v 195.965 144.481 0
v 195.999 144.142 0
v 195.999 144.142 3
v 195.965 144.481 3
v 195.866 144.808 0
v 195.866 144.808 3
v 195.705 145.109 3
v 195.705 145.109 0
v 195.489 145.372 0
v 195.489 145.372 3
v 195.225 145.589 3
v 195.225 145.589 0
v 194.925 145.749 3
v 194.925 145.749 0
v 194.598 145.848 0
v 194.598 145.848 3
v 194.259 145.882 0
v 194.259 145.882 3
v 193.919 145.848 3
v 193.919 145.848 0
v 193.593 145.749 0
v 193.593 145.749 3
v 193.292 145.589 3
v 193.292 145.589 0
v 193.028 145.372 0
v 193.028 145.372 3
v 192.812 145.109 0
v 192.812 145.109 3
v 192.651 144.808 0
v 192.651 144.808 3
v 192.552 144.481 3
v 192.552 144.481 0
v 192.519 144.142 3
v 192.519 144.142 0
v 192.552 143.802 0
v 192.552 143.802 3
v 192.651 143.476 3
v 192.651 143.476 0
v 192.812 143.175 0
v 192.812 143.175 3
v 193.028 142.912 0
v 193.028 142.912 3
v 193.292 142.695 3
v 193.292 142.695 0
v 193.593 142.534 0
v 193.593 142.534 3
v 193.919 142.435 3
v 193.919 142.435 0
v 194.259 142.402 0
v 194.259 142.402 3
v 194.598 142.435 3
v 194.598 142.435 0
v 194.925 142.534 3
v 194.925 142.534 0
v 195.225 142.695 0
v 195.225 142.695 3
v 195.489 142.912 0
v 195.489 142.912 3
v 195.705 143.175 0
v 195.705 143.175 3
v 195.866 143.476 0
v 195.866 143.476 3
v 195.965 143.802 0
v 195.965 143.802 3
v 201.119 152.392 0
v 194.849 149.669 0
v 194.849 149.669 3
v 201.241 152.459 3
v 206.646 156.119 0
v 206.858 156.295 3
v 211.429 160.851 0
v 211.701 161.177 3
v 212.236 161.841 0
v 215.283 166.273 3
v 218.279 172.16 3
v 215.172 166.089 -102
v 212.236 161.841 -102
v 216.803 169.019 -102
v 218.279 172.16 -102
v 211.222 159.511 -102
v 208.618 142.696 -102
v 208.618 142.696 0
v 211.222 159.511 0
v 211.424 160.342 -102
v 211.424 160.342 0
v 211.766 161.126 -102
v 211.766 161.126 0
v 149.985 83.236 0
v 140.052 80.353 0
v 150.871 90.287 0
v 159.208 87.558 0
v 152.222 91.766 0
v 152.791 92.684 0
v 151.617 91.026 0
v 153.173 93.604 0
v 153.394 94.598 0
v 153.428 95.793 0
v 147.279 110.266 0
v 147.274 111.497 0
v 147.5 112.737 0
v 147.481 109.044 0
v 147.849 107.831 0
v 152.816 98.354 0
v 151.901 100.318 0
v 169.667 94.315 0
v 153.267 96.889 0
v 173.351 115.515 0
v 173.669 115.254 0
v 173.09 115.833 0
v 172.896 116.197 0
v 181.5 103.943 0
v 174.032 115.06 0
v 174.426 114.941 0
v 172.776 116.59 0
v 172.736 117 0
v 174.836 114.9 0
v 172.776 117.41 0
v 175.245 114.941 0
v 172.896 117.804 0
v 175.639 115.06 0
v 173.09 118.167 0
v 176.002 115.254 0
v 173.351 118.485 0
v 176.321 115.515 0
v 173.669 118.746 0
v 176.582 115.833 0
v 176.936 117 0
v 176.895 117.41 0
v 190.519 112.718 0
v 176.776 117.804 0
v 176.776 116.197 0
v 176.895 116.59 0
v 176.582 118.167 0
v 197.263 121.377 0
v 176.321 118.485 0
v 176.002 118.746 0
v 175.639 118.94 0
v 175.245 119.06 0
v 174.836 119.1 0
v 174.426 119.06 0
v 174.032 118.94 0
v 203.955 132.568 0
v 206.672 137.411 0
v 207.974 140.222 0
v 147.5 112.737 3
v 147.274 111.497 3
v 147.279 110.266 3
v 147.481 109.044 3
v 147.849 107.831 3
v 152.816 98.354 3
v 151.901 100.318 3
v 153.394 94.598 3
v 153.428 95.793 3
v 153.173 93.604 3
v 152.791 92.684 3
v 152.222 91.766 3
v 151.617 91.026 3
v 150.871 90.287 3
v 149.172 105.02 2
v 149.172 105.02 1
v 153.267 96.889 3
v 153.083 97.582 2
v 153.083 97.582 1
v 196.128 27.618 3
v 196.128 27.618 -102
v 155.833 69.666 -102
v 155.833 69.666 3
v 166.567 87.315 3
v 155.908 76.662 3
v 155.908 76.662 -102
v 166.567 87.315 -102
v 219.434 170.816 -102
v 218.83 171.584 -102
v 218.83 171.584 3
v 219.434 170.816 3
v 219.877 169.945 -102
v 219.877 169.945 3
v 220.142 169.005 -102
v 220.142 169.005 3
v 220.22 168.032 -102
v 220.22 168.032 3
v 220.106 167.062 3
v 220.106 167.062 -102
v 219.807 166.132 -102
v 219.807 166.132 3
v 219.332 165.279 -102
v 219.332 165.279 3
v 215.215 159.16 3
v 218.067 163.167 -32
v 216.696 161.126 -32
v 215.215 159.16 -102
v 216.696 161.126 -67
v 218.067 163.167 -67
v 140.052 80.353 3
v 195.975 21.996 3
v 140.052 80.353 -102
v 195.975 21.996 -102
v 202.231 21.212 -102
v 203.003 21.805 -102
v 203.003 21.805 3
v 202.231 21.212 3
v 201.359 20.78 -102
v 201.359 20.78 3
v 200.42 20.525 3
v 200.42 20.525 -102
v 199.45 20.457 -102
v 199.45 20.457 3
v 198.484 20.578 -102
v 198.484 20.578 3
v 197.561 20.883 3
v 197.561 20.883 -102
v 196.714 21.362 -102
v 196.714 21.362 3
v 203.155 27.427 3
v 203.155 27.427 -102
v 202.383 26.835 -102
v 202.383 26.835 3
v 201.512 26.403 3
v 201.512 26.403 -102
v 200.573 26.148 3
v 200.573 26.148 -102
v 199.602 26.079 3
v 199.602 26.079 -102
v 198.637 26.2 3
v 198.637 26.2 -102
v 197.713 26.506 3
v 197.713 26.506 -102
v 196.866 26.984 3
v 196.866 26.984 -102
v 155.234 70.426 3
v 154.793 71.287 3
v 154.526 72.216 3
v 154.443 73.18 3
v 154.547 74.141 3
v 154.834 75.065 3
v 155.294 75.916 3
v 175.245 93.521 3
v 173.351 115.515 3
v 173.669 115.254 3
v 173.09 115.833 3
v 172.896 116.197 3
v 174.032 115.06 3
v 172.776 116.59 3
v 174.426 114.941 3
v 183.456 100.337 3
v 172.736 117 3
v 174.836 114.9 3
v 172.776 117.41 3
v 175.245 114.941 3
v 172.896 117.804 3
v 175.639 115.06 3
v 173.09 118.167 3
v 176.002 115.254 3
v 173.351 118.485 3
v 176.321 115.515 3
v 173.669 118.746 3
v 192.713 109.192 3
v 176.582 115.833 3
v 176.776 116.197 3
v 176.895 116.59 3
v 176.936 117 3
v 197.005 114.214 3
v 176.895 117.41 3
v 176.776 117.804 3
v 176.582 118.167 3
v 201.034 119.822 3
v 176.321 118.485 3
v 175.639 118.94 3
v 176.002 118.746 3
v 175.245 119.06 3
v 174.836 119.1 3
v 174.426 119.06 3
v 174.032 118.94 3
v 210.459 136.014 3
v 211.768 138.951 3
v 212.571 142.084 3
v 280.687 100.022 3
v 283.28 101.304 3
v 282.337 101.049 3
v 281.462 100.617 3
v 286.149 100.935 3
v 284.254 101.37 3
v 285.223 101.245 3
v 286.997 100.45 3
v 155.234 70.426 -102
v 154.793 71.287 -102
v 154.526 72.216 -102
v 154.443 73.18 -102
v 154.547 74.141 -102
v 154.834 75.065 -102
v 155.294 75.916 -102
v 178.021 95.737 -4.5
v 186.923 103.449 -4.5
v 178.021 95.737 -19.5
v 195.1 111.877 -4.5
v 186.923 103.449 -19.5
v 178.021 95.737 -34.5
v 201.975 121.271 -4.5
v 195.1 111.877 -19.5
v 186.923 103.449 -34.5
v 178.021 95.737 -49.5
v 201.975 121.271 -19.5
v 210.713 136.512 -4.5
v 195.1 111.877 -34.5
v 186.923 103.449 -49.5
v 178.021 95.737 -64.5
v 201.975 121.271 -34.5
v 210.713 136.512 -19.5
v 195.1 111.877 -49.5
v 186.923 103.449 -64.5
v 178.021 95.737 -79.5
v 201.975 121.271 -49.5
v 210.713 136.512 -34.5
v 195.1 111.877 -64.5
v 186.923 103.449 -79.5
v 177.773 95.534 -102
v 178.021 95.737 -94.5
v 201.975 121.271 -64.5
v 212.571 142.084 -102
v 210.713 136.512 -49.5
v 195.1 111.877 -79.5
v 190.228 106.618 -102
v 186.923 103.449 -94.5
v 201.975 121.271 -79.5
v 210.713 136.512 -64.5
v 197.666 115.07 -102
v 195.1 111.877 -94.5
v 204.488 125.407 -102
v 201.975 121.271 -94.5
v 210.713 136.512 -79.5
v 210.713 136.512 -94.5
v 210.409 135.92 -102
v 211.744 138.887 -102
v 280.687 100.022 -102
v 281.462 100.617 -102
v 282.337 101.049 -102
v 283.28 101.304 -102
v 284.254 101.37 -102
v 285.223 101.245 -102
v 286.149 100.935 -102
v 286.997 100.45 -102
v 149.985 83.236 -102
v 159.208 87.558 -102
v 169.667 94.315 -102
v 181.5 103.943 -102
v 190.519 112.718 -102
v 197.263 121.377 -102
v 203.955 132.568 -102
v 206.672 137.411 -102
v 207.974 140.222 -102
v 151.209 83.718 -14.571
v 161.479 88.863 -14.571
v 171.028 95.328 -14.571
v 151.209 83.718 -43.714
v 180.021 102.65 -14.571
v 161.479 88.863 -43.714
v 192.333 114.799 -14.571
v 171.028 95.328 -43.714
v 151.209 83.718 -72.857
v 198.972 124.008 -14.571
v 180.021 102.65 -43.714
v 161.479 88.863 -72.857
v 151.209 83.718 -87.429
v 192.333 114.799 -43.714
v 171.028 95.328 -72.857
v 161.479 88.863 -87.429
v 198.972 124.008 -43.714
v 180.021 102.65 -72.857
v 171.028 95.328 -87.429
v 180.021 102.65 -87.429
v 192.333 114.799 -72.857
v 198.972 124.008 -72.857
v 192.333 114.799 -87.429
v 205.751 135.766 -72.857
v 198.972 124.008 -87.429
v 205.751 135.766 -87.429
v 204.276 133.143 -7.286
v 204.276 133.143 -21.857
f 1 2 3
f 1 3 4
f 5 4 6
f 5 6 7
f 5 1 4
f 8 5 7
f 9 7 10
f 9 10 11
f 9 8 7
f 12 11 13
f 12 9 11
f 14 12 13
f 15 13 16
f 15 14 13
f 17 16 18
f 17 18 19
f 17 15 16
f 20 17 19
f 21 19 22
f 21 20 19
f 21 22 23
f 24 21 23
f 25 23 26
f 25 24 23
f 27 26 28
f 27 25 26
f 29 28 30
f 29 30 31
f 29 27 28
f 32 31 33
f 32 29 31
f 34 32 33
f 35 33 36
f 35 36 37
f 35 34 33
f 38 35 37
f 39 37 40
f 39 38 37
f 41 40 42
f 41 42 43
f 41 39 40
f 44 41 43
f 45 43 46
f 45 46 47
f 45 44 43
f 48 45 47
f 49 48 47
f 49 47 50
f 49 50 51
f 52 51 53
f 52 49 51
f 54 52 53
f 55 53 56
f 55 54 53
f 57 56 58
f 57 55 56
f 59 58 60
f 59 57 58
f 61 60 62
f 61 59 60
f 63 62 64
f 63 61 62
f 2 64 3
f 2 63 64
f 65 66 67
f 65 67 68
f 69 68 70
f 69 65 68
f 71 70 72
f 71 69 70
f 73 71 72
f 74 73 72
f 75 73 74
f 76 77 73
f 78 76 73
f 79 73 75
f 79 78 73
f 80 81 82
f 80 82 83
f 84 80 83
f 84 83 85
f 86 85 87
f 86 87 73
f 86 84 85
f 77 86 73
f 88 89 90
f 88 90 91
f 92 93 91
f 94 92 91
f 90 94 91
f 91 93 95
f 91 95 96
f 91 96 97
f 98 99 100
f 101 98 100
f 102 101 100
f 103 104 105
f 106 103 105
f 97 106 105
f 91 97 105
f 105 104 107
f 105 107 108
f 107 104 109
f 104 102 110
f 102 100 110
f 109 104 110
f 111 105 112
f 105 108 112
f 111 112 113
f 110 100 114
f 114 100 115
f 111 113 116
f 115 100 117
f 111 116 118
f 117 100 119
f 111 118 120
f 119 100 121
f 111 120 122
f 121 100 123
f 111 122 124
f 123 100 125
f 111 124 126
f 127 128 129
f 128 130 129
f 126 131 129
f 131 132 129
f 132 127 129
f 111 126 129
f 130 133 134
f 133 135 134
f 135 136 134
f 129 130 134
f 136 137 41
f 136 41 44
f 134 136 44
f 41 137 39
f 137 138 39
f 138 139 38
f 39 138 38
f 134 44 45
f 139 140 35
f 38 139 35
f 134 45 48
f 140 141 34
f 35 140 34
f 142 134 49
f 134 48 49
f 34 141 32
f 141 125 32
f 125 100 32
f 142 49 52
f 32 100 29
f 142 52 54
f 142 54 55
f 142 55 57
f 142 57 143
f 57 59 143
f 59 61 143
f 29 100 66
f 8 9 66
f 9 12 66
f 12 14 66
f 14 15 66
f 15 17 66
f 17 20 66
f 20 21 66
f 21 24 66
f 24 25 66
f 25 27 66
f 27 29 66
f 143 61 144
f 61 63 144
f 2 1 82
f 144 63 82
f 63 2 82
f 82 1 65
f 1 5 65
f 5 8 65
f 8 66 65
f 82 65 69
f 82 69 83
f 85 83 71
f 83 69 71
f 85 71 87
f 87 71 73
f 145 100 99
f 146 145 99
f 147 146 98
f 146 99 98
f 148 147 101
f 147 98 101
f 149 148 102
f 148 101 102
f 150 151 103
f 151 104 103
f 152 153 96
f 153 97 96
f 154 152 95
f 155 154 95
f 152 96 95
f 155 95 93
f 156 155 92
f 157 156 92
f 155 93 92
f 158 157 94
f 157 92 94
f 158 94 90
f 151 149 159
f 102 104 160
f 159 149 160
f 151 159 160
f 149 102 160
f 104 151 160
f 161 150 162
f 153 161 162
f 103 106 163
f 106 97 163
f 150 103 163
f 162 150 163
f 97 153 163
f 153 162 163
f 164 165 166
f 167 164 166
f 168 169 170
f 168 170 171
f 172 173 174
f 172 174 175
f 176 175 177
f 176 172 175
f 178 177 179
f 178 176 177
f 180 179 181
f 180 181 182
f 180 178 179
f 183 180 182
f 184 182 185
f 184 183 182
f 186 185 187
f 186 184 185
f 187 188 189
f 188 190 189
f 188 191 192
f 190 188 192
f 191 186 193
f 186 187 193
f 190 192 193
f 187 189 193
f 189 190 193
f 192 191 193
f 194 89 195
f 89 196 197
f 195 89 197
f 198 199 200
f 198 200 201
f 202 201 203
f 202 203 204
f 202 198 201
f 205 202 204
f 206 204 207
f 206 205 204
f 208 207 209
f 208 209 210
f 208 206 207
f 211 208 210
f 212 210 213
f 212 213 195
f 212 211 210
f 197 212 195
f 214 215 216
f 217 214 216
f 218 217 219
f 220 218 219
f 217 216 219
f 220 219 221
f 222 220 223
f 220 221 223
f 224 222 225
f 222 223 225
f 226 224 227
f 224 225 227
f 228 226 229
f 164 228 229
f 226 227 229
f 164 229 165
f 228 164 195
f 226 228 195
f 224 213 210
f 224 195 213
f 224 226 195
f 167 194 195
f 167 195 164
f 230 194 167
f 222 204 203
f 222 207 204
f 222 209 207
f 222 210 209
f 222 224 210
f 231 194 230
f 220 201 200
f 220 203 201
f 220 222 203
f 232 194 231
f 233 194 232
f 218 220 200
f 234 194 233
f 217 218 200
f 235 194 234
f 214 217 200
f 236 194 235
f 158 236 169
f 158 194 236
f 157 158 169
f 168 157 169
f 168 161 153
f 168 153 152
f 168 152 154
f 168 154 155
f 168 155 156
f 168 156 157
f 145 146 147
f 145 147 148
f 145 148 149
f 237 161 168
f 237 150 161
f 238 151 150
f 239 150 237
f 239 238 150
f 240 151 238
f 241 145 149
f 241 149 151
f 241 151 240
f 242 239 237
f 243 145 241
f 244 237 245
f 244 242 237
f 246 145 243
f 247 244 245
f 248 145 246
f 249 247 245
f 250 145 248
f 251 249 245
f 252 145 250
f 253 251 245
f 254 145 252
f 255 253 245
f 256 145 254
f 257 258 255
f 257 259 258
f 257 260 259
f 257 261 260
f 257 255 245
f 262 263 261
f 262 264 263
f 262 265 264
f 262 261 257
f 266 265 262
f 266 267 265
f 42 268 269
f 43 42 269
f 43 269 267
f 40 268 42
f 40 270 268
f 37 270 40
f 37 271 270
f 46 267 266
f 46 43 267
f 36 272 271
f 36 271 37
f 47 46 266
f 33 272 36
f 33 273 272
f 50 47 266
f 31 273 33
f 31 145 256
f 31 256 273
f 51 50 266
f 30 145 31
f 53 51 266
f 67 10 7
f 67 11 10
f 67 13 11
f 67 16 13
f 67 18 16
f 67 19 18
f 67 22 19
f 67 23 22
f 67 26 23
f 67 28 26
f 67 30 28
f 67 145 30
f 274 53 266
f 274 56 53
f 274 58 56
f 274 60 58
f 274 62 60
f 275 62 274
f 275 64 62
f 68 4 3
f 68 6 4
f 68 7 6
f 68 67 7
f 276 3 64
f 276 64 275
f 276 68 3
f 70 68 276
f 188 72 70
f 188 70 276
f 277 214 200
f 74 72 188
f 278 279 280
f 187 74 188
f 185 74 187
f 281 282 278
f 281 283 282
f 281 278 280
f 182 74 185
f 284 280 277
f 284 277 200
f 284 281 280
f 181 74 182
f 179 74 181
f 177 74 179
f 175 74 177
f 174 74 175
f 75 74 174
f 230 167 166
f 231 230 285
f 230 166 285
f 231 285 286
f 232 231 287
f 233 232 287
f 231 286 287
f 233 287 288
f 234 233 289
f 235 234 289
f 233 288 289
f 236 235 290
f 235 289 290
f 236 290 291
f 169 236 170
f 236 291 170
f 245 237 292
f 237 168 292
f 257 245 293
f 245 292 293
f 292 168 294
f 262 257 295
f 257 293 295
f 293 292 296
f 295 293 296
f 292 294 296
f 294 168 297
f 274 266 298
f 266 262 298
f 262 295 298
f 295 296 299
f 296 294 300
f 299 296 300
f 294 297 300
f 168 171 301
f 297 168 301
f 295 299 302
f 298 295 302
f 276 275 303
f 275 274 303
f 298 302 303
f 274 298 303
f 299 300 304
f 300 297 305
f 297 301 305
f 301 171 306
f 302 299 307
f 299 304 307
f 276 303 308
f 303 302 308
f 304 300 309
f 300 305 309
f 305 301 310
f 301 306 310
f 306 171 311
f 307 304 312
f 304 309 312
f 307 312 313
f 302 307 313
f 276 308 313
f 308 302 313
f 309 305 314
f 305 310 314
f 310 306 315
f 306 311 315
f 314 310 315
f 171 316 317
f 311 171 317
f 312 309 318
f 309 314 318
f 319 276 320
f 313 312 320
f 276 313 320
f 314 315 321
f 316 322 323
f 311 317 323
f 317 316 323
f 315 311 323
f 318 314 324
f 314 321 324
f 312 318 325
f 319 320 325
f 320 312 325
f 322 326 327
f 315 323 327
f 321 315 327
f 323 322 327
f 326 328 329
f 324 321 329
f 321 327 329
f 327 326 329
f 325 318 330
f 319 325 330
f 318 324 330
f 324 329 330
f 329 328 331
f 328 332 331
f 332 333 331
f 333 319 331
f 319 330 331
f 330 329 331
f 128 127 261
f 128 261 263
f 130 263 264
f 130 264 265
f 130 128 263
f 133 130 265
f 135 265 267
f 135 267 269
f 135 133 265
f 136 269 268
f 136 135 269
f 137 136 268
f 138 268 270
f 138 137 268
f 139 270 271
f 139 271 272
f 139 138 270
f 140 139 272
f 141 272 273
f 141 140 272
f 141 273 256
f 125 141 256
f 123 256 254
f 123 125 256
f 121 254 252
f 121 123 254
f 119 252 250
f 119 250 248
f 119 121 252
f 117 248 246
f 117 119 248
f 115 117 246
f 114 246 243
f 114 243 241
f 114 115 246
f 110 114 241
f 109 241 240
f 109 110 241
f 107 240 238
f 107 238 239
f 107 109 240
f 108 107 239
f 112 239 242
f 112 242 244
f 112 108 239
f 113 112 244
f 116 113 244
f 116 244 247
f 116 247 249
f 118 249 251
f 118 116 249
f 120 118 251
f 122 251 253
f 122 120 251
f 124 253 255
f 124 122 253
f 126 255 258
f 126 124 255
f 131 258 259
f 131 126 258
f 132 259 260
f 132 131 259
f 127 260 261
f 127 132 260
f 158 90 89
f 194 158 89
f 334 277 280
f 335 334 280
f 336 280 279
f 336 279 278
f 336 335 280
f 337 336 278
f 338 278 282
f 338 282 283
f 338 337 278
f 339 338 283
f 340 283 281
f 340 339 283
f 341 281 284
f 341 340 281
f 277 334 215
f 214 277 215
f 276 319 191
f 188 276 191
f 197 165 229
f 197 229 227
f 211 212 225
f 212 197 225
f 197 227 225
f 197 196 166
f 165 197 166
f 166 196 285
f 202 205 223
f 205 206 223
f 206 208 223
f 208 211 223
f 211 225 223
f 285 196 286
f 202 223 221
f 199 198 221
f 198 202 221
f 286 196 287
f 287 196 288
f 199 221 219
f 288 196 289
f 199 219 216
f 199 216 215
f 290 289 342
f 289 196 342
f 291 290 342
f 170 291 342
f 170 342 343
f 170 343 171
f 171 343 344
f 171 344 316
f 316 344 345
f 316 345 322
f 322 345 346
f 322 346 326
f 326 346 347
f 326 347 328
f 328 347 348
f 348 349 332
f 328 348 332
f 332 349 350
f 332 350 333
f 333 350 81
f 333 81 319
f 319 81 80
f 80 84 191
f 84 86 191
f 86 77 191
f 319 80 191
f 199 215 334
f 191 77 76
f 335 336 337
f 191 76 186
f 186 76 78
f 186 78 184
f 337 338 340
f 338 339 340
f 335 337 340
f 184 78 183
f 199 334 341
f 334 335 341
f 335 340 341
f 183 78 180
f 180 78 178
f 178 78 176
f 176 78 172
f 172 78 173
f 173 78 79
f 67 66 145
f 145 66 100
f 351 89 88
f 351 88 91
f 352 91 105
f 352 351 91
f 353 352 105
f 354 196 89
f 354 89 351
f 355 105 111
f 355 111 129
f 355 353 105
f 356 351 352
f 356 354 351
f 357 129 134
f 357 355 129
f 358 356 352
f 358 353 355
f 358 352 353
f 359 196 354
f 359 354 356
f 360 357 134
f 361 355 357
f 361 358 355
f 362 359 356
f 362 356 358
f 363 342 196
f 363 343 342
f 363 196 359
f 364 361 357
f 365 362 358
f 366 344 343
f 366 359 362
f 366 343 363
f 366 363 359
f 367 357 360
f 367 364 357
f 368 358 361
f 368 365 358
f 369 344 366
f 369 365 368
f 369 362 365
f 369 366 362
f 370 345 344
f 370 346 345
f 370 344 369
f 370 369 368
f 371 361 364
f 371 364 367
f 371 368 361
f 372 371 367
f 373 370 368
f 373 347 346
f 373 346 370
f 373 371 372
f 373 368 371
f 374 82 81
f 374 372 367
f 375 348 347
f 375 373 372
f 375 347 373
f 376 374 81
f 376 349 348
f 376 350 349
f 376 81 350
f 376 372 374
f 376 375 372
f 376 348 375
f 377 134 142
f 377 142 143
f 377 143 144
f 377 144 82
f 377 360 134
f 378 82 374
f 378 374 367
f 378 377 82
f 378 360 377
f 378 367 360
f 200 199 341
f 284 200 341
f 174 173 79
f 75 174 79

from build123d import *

# Parameters (mm, degrees)
SKETCH8_R                = 2.1
SKETCH8_R_2              = 1.74
BOSS_EXTRUDE5_DEPTH      = 3
BOSS_EXTRUDE6_DEPTH      = 3
BOSS_EXTRUDE6_DEPTH_BACK = 102
CUT_EXTRUDE6_DEPTH       = 102
CUT_EXTRUDE7_DEPTH       = 351.757992155
FILLET4_START            = -103
FILLET4_DEPTH            = 106.0000125
FILLET4_2_DEPTH          = 103
FILLET4_START_2          = -102
FILLET4_3_DEPTH          = 105


with BuildPart() as part:
    # Sketch8 → Boss-Extrude5 (new body)
    with BuildSketch(Plane.XY):
        with BuildLine():
            Line((194.848649274, 149.66882856), (147.499802828, 112.737422991))
            add(Edge.make_bspline(
                [(147.499802828, 112.737422991), (145.265647531, 104.835476757), (158.932413363, 97.556045407), (150.870592183, 90.287256683)],
                knots=[0, 0, 0, 0, 1, 1, 1, 1], degree=3))
            Line((150.870592183, 90.287256683), (140.051642672, 80.353100098))
            add(Edge.make_bspline(
                [(140.051642672, 80.353100098), (155.592742122, 83.448151063), (173.098788956, 95.918040541), (191.414470585, 112.977156665), (199.578997946, 124.491589325), (204.778131359, 134.171165561), (209.351664244, 141.990562819), (208.010100445, 153.27525953), (198.018173528, 148.56277144), (194.848649274, 149.66882856)],
                knots=[0, 0, 0, 0, 0.401406189, 0.551773829, 0.650466729, 0.768454277, 0.83589521, 0.892031584, 1, 1, 1, 1], degree=3))
        make_face()
        with Locations((174.835792074, 117.000151074)):
            Circle(SKETCH8_R, mode=Mode.SUBTRACT)
        with Locations((194.258704, 144.1418815)):
            Circle(SKETCH8_R_2, mode=Mode.SUBTRACT)
    extrude(amount=BOSS_EXTRUDE5_DEPTH)

    # Sketch18 → Boss-Extrude6 (add, two sides: drawn at the far end of the back side and taken through both)
    with BuildSketch(Plane.XY.offset(-BOSS_EXTRUDE6_DEPTH_BACK)):
        with BuildLine():
            Line((140.051642672, 80.353100098), (199.394938769, 18.42711696))
            Line((199.394938769, 18.42711696), (286.996969106, 100.450384619))
            Line((286.996969106, 100.450384619), (218.278514002, 172.159544237))
            add(Edge.make_bspline(
                [(194.848649274, 149.66882856), (210.911598583, 155.039307248), (218.278514002, 172.159544237)],
                knots=[0, 0, 0, 1, 1, 1], degree=2))
            add(Edge.make_bspline(
                [(140.051642672, 80.353100098), (155.592742122, 83.448151063), (173.098788956, 95.918040541), (191.414470585, 112.977156665), (199.578997946, 124.491589325), (204.778131359, 134.171165561), (209.351664244, 141.990562819), (208.010100445, 153.27525953), (198.018173528, 148.56277144), (194.848649274, 149.66882856)],
                knots=[0, 0, 0, 0, 0.401406189, 0.551773829, 0.650466729, 0.768454277, 0.83589521, 0.892031584, 1, 1, 1, 1], degree=3))
        make_face()
    extrude(amount=BOSS_EXTRUDE6_DEPTH + BOSS_EXTRUDE6_DEPTH_BACK)

    # Sketch28 → Cut-Extrude6 (cut)
    with BuildSketch(Plane(origin=(0, 0, -102), x_dir=(-1, 0, 0), z_dir=(0, 0, -1))):
        with BuildLine():
            Line((-208.618011268, 142.695698437), (-211.42914656, 160.85099201))
            add(Edge.make_bspline(
                [(-211.42914656, 160.85099201), (-204.811588501, 152.999832831), (-194.848649266, 149.668828558)],
                knots=[0, 0, 0, 1, 1, 1], degree=2))
            add(Edge.make_bspline(
                [(-194.848649266, 149.668828558), (-198.018173528, 148.56277144), (-208.010100445, 153.27525953), (-208.973304937, 145.173169587), (-208.63144162, 142.782828241), (-208.618011268, 142.695698437)],
                knots=[0, 0, 0, 0, 0.107968416, 0.16410479, 0.166243216, 0.166243216, 0.166243216, 0.166243216], degree=3))
        make_face()
    extrude(amount=-CUT_EXTRUDE6_DEPTH, mode=Mode.SUBTRACT)

    # Sketch29 → Cut-Extrude7 (cut, through all)
    with BuildSketch(Plane(origin=(0, 0, -102), x_dir=(-1, 0, 0), z_dir=(0, 0, -1))):
        with BuildLine():
            Line((-219.332027088, 165.278919845), (-221.693040793, 168.596413398))
            Line((-221.693040793, 168.596413398), (-284.229221249, 103.338587978))
            Line((-284.229221249, 103.338587978), (-281.309153571, 100.604479056))
            Line((-281.309153571, 100.604479056), (-199.54725859, 24.049429241))
            Line((-199.54725859, 24.049429241), (-152.445384828, 73.201229566))
            Line((-152.445384828, 73.201229566), (-166.56681579, 87.314829228))
            add(Edge.make_bspline(
                [(-166.56681579, 87.314829228), (-167.247375692, 87.754878287), (-167.923513322, 88.203571781), (-169.408228588, 89.212727742), (-170.215496626, 89.77742737), (-171.813710515, 90.924683403), (-172.605151804, 91.507550134), (-174.958933573, 93.280907842), (-176.500751491, 94.49613279), (-179.542120366, 96.977523194), (-181.041657541, 98.243705262), (-184.010446881, 100.812569153), (-185.48012911, 102.114732661), (-188.36646995, 104.782964203), (-189.785315925, 106.151551275), (-192.521802781, 108.956131315), (-193.84163234, 110.393993249), (-197.617679355, 114.842362145), (-199.885576111, 117.991237054), (-204.064324609, 124.551324395), (-205.96551608, 127.969600494), (-208.351957694, 132.235160217), (-208.830232235, 133.087828175), (-209.795652517, 134.789170357), (-210.277597021, 135.640186131), (-211.148682062, 137.383997182), (-211.538483698, 138.276494838), (-212.172269158, 140.127136004), (-212.416807154, 141.08503003), (-212.570906768, 142.083638665)],
                knots=[0.224160015, 0.224160015, 0.224160015, 0.224160015, 0.25, 0.25, 0.28125, 0.28125, 0.3125, 0.3125, 0.375, 0.375, 0.4375, 0.4375, 0.5, 0.5, 0.5625, 0.5625, 0.625, 0.625, 0.75, 0.75, 0.875, 0.875, 0.90625, 0.90625, 0.9375, 0.9375, 0.96875, 0.96875, 1, 1, 1, 1], degree=3))
            Line((-212.570906768, 142.083638665), (-215.214954835, 159.159823598))
            add(Edge.make_bspline(
                [(-215.214954835, 159.159823598), (-216.753654874, 161.087602867), (-218.117640246, 163.132934646), (-219.332027088, 165.278919845)],
                knots=[8.2e-08, 8.2e-08, 8.2e-08, 8.2e-08, 1, 1, 1, 1], degree=3))
        make_face()
    extrude(amount=-CUT_EXTRUDE7_DEPTH, mode=Mode.SUBTRACT)

    # Fillet4: read off the stored shape, not the designer's step
    # Fillet4 outline → Fillet4 (cut)
    with BuildSketch(Plane.XY.offset(FILLET4_START)):
        with BuildLine():
            ThreePointArc((280.686945589, 100.021895163), (283.765601821, 101.360567021), (286.996969106, 100.450384619))
            Line((286.996969106, 100.450384619), (284.229221249, 103.338587978))
            Line((284.229221249, 103.338587978), (280.686945589, 100.021895163))
        make_face()
        with BuildLine():
            ThreePointArc((203.002745436, 21.805167569), (199.449928109, 20.456841246), (195.97532653, 21.995554573))
            Line((195.97532653, 21.995554573), (199.394938769, 18.42711696))
            Line((199.394938769, 18.42711696), (203.002745436, 21.805167569))
        make_face()
        with BuildLine():
            Line((221.693040793, 168.596413398), (218.830479101, 171.583556997))
            ThreePointArc((218.830479101, 171.583556997), (220.20472039, 168.520612757), (219.332027088, 165.278919845))
            Line((219.332027088, 165.278919845), (221.693040793, 168.596413398))
        make_face()
    extrude(amount=FILLET4_DEPTH, mode=Mode.SUBTRACT)

    # Fillet4 2 outline → Fillet4 2 (cut)
    with BuildSketch(Plane.XY.offset(FILLET4_START)):
        with BuildLine():
            Line((211.42914656, 160.85099201), (211.221601366, 159.510592657))
            ThreePointArc((211.221601366, 159.510592657), (211.57833699, 160.741370081), (212.236188394, 161.841054082))
            add(Edge.make_bspline(
                [(212.236188394, 161.841054082), (211.839086372, 161.337350073), (211.42914656, 160.85099201)],
                knots=[0.341334138, 0.341334138, 0.341334138, 0.379756542, 0.379756542, 0.379756542], degree=2))
        make_face()
    extrude(amount=FILLET4_2_DEPTH, mode=Mode.SUBTRACT)

    # Fillet4 3 outline → Fillet4 3 (add)
    with BuildSketch(Plane.XY.offset(FILLET4_START_2)):
        with BuildLine():
            Line((152.445384828, 73.201229566), (155.832885267, 69.666301295))
            ThreePointArc((155.832885267, 69.666301295), (154.443188104, 73.179681156), (155.908344132, 76.662268423))
            Line((155.908344132, 76.662268423), (152.445384828, 73.201229566))
        make_face()
        with BuildLine():
            Line((199.54725859, 24.049429241), (203.155065257, 27.427479849))
            ThreePointArc((203.155065257, 27.427479849), (199.60224793, 26.079153527), (196.127646351, 27.617866853))
            Line((196.127646351, 27.617866853), (199.54725859, 24.049429241))
        make_face()
    extrude(amount=FILLET4_3_DEPTH)


solid = part.part
